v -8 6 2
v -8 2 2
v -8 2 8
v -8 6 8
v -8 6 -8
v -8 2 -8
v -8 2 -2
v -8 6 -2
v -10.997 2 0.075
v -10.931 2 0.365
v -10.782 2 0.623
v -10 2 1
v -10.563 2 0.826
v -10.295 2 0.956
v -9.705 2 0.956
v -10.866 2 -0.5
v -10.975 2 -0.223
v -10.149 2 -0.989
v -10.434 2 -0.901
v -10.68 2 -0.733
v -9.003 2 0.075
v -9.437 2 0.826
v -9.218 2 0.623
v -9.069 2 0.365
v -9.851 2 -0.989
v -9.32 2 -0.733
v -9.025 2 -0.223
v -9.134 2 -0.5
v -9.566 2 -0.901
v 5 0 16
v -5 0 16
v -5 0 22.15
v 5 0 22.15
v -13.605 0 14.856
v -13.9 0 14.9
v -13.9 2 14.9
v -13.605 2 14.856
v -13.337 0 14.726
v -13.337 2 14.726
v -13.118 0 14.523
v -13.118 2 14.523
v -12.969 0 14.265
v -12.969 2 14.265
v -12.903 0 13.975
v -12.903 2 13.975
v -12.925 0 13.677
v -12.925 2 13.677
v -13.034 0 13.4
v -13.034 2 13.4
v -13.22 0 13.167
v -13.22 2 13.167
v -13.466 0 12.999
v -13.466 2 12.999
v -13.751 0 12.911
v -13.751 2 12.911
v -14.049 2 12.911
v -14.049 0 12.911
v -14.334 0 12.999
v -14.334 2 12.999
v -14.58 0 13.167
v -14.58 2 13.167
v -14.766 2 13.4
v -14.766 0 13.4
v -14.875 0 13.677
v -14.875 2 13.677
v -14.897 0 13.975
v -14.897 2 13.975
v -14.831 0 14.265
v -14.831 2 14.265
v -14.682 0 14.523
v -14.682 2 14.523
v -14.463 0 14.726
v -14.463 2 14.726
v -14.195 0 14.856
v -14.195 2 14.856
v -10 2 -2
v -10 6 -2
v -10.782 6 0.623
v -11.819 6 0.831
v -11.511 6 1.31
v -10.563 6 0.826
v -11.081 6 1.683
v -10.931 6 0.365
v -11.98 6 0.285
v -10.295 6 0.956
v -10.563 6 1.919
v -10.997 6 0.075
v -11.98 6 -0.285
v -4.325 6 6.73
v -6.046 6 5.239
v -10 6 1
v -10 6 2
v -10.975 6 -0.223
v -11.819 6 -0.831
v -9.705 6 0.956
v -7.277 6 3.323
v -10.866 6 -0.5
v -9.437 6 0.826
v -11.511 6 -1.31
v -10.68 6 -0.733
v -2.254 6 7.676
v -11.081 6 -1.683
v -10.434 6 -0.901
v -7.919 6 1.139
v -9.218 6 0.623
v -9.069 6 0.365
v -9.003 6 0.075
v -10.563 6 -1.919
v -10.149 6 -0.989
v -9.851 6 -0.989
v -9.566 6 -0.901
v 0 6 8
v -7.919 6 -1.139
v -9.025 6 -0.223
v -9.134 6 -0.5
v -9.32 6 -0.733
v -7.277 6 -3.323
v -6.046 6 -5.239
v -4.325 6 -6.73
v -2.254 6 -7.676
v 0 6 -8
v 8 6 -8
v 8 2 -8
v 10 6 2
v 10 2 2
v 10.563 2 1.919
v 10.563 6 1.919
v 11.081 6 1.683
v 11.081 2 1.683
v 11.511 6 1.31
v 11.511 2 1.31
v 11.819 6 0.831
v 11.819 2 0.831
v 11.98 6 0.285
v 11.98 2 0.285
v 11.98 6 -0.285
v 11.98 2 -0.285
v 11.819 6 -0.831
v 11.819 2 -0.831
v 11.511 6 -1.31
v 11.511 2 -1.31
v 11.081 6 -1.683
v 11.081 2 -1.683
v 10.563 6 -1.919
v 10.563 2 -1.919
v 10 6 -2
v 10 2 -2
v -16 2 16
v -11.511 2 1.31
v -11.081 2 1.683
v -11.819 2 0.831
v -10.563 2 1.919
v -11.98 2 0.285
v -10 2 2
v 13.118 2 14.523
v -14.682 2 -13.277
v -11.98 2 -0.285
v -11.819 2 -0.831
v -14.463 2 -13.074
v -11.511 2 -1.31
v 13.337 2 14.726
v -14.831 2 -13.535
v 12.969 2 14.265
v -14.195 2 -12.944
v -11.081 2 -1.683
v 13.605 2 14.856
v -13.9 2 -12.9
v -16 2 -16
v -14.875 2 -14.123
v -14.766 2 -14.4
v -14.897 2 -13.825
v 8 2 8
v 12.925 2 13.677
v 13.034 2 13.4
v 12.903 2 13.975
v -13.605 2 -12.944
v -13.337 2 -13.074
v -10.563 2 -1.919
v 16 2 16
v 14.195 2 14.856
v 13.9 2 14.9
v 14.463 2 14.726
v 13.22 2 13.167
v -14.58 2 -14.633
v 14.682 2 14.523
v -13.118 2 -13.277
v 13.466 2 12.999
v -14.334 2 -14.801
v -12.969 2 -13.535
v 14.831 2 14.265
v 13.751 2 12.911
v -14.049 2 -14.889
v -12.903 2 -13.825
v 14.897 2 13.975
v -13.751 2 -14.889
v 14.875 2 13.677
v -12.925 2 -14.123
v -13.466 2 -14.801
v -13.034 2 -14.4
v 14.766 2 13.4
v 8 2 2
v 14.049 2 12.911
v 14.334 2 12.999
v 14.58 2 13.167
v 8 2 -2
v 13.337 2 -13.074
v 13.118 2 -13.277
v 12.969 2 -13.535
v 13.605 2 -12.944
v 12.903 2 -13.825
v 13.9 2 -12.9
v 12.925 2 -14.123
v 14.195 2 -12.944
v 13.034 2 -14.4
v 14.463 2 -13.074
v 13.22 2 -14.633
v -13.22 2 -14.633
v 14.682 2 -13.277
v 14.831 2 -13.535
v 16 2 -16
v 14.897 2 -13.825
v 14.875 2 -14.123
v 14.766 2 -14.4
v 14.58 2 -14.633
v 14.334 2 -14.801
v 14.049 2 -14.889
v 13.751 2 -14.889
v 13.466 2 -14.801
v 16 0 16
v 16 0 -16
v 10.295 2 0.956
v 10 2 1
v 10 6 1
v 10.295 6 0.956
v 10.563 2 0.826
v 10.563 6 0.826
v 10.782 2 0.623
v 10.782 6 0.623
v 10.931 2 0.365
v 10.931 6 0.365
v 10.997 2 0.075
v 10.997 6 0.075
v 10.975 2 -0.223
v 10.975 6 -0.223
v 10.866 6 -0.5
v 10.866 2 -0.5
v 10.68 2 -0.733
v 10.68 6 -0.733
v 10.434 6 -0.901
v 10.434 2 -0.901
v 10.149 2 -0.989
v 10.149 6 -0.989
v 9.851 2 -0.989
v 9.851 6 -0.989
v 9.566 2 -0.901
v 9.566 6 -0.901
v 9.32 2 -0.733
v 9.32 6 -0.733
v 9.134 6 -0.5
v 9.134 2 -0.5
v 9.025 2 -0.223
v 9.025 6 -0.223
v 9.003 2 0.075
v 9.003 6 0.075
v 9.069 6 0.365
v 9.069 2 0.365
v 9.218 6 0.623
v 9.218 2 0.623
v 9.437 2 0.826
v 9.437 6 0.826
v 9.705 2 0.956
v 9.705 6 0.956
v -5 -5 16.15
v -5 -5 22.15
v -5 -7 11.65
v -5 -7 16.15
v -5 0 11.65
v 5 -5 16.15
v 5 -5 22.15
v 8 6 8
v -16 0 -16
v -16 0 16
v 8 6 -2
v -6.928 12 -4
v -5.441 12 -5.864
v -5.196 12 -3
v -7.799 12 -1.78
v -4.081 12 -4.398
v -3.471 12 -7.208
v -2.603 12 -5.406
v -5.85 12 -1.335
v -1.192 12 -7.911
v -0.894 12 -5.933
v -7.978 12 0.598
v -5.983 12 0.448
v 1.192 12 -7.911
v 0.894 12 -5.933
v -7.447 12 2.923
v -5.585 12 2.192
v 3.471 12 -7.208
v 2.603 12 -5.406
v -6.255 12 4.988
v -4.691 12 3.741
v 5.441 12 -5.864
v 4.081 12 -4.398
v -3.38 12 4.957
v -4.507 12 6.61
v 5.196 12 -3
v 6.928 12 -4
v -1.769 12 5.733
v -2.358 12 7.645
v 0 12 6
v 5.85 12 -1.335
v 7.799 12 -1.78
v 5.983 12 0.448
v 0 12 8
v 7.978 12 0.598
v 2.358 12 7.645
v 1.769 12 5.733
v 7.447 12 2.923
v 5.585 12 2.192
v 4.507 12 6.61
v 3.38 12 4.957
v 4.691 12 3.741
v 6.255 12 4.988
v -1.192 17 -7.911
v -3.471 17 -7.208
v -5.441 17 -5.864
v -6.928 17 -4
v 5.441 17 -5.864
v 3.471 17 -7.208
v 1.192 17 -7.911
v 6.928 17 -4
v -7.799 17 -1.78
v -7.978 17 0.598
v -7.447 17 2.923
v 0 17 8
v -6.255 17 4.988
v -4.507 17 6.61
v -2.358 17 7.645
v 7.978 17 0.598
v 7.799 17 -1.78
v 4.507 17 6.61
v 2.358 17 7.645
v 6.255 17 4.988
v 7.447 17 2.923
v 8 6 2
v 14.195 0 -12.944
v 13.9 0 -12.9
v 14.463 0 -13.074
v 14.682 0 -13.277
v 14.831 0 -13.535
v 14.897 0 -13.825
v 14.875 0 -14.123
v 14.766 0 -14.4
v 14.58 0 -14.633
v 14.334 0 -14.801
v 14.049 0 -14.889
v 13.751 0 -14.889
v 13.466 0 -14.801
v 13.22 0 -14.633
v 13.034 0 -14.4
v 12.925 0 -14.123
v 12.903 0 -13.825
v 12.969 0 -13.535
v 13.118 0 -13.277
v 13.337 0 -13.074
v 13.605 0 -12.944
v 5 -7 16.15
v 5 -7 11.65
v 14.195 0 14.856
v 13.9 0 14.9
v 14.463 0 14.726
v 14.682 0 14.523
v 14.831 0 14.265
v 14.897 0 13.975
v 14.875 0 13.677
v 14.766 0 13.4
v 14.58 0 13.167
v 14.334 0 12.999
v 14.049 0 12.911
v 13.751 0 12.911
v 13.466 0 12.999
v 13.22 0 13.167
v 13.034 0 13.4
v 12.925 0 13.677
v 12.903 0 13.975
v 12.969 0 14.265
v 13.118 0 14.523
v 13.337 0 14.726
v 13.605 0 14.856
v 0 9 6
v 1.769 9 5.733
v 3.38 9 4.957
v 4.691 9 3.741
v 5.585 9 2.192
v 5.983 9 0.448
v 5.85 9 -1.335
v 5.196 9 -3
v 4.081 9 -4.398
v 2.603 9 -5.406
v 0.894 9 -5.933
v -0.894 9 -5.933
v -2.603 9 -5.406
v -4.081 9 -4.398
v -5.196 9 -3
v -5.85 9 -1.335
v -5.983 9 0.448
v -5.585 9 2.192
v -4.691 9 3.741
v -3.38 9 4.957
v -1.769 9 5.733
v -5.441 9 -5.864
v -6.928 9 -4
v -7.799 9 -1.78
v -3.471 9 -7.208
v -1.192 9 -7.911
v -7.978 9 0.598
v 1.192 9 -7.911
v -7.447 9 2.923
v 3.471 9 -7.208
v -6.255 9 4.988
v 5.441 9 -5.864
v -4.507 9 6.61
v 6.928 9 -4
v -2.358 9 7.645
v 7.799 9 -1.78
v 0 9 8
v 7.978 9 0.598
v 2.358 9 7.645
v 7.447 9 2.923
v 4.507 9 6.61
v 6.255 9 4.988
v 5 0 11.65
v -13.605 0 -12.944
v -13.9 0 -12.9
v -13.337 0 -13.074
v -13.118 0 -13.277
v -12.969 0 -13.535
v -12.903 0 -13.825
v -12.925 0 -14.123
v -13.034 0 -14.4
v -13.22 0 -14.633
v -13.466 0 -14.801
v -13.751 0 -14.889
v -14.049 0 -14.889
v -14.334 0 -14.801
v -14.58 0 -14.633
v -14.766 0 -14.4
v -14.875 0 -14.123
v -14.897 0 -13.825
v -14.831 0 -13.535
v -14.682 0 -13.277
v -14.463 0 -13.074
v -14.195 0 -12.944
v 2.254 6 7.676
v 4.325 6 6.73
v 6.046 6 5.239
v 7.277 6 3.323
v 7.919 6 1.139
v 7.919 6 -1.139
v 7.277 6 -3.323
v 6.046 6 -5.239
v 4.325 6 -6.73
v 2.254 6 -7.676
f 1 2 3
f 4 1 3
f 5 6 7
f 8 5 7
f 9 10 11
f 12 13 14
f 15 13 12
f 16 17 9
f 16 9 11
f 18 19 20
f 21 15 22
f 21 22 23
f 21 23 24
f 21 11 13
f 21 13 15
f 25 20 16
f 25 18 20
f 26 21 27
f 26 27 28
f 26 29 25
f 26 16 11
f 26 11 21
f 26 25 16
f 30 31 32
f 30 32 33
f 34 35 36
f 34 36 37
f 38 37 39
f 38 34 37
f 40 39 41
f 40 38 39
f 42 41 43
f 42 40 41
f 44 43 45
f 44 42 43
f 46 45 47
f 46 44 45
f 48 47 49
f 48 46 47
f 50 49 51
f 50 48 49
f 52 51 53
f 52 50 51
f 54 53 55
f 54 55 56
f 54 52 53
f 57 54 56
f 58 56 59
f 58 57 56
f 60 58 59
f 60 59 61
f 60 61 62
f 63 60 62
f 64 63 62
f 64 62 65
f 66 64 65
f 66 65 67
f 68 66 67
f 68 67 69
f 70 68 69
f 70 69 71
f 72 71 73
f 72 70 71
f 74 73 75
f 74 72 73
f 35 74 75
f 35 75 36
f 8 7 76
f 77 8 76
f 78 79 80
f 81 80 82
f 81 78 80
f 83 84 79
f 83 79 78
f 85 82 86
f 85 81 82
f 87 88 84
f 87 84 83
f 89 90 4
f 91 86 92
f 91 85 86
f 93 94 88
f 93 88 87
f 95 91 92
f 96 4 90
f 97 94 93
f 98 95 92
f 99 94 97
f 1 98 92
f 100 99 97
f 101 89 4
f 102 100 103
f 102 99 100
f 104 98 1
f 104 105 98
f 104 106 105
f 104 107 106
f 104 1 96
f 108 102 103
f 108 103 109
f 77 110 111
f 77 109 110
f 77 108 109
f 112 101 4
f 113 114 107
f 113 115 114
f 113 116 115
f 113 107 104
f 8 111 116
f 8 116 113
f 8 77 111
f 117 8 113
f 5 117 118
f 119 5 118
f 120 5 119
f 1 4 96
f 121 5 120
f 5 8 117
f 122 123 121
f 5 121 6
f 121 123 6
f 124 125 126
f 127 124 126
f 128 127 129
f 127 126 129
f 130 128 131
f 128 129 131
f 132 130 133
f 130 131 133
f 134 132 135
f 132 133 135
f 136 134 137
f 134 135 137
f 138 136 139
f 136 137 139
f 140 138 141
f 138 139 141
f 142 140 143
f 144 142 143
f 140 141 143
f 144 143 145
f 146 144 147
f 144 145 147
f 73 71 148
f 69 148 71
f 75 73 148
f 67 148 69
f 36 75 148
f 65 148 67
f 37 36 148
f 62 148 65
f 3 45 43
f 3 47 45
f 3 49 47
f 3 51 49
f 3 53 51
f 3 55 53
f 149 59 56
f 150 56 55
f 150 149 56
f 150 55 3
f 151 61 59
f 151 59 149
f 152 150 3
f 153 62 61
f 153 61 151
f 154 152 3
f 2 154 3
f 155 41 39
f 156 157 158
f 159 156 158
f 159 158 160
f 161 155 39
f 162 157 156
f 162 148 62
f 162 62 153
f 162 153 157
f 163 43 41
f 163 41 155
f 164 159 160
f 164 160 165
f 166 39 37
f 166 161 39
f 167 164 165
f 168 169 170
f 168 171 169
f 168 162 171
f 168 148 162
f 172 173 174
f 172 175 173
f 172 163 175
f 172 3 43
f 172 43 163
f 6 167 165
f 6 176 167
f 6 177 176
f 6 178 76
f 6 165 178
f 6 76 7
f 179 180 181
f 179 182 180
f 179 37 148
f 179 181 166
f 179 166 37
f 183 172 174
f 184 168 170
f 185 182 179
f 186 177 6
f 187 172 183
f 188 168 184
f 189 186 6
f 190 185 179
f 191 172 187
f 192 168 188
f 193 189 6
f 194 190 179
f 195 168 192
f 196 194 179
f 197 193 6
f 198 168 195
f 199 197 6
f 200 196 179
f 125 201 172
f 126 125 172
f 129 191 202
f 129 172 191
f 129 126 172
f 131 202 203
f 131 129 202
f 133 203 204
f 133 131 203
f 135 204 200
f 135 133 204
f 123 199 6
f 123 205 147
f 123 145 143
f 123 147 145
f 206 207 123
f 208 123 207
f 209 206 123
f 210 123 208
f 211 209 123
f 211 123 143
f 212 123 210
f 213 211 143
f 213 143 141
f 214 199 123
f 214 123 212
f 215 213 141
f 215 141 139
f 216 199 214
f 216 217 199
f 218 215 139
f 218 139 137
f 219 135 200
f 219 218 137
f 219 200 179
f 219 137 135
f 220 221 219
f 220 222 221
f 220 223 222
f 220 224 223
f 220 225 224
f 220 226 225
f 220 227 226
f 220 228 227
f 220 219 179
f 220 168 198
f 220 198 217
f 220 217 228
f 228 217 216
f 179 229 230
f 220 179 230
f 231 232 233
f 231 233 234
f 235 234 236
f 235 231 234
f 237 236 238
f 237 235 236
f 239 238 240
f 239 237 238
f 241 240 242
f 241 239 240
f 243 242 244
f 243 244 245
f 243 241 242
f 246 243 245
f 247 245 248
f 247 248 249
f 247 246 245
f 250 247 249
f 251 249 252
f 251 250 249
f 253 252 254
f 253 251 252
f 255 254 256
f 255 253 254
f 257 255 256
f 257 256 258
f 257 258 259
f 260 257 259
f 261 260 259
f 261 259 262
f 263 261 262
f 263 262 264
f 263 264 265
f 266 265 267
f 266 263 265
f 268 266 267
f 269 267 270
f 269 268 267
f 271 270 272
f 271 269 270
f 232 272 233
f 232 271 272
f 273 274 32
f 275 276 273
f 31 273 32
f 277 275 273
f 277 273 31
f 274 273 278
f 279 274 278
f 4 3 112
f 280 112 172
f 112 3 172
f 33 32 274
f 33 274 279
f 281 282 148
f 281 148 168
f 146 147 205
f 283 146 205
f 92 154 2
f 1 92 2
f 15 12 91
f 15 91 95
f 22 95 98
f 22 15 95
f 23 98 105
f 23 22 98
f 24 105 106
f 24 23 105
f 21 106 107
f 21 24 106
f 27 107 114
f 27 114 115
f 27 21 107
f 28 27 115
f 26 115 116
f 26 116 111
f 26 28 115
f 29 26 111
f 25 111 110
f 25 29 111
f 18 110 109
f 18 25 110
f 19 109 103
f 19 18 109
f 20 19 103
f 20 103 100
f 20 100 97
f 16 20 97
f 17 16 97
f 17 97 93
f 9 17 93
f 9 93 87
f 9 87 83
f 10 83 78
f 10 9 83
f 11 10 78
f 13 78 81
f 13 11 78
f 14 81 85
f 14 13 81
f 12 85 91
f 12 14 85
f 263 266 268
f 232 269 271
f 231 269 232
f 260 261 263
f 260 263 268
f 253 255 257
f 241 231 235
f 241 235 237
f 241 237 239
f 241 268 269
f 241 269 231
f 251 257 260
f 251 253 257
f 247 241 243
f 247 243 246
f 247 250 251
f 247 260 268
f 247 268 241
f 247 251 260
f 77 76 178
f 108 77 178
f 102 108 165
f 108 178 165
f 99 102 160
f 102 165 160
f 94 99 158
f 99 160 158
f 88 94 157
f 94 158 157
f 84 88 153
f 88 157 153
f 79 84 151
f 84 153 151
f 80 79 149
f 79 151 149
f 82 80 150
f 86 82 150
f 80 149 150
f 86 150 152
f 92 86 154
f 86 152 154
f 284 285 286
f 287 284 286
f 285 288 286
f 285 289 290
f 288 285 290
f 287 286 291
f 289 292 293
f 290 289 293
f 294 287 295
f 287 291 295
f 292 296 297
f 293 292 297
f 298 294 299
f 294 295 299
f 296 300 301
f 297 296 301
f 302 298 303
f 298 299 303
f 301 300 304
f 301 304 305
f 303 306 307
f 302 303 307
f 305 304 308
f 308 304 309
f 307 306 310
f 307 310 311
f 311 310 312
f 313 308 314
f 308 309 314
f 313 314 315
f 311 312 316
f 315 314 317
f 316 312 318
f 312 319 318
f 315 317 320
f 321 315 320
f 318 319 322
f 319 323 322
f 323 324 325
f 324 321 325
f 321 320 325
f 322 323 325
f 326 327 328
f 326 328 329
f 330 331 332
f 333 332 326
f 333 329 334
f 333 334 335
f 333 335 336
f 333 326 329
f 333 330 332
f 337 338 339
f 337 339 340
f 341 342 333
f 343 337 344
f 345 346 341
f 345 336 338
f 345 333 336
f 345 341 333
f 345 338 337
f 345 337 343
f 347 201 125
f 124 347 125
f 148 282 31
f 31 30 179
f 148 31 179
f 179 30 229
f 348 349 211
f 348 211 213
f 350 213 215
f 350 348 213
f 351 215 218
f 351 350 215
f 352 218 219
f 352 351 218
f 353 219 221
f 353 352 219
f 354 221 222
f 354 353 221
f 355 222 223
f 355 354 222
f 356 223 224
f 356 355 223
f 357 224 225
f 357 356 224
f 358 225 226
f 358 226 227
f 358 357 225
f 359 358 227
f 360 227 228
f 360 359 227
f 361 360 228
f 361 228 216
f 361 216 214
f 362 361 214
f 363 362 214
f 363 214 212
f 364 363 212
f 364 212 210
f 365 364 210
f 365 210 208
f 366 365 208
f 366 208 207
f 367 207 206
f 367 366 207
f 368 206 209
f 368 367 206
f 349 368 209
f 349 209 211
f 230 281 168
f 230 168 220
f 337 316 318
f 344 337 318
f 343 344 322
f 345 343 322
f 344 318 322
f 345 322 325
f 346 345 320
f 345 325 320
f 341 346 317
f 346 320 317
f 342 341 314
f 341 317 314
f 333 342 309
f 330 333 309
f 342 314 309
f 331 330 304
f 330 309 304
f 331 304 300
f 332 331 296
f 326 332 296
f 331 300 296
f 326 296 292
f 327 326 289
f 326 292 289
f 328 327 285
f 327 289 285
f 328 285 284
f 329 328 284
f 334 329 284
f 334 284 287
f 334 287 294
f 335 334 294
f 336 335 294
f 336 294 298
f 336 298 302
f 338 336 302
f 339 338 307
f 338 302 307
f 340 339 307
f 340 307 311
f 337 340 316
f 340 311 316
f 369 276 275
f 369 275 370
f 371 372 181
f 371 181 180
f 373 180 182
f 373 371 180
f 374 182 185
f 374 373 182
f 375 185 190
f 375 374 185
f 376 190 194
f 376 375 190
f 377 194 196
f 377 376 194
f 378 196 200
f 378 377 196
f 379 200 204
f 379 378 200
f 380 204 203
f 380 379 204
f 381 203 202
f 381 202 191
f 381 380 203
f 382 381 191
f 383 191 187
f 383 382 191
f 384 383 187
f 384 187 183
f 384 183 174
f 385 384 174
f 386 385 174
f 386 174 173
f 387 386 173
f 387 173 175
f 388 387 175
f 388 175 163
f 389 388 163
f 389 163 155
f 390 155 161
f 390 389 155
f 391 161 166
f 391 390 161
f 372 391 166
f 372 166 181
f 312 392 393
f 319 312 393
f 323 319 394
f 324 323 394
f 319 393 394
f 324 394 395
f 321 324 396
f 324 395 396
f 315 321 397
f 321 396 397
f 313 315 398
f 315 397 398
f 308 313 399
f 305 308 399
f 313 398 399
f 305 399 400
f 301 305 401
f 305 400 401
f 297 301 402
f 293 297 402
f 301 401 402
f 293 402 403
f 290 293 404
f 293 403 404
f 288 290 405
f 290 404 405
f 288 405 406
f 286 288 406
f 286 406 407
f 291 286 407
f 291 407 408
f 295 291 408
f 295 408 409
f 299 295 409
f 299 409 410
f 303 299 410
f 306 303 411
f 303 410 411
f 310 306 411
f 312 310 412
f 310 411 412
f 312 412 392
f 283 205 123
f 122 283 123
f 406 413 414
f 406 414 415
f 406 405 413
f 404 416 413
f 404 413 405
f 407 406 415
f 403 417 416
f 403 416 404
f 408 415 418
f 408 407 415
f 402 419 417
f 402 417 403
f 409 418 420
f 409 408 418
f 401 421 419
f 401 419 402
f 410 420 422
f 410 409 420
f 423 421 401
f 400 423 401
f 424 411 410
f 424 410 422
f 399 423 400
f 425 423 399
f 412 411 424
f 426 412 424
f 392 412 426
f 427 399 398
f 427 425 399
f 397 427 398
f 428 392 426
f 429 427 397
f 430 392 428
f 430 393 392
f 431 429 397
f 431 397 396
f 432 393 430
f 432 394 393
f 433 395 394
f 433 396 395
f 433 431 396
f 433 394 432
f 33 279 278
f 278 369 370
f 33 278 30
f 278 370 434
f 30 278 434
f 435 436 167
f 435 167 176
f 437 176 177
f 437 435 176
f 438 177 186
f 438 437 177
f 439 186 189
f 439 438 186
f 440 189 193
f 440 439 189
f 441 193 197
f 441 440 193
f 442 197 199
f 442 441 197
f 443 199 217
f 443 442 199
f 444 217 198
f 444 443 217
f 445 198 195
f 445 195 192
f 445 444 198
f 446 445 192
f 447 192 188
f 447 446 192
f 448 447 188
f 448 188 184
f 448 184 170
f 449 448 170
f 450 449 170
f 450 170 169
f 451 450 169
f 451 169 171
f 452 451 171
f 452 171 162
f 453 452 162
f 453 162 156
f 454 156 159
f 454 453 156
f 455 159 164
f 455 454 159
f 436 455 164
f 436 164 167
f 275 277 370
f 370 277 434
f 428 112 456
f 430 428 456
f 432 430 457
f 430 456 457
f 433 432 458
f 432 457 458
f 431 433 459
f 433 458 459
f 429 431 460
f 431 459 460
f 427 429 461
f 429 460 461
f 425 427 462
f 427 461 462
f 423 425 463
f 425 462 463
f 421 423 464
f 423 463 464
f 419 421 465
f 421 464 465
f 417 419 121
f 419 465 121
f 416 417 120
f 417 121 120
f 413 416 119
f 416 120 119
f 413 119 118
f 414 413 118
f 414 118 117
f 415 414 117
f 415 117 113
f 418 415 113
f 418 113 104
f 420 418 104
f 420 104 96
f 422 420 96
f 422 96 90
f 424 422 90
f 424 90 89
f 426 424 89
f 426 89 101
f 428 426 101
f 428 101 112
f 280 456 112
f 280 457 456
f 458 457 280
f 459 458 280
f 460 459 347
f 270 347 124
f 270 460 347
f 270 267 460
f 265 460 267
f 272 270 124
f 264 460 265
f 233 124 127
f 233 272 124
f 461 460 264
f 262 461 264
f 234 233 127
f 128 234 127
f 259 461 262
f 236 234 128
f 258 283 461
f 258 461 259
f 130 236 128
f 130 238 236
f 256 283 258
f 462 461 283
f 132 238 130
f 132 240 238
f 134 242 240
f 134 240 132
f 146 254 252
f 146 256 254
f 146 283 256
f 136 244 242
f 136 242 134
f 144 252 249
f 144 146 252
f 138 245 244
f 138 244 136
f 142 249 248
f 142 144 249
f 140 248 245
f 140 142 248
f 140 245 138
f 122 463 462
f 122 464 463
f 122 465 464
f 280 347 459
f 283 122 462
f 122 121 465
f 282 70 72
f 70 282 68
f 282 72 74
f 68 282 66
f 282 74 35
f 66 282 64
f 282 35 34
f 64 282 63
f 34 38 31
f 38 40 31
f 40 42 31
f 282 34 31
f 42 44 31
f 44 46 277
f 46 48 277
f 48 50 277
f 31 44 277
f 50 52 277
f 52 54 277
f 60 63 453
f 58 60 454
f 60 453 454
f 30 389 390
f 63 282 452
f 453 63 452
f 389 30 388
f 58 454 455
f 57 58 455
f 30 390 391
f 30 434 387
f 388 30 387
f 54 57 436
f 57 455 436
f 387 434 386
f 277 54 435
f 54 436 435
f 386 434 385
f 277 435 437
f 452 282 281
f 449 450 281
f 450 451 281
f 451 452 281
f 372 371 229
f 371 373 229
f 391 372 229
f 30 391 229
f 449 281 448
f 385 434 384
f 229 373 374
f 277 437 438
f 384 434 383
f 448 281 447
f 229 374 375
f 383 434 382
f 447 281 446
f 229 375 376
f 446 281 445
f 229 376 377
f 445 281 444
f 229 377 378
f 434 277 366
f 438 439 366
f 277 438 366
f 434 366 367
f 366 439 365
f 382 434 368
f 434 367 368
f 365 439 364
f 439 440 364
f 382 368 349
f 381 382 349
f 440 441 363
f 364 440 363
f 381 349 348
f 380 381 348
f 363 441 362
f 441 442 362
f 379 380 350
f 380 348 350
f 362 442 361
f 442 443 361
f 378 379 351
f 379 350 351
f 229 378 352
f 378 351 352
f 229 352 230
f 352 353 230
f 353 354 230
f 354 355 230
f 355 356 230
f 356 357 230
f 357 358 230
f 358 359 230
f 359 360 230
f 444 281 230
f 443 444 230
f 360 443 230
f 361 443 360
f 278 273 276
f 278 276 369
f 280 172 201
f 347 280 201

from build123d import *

# Parameters (mm, degrees)
SKETCH1_W           = 32
SKETCH1_H           = 32
SKETCH1_R           = 1
BOSS_EXTRUDE1_DEPTH = 2
SKETCH2_R           = 1
BOSS_EXTRUDE2_DEPTH = 4
SKETCH3_R           = 8
BOSS_EXTRUDE3_DEPTH = 3
SKETCH4_R           = 6
BOSS_EXTRUDE4_DEPTH = 3
SKETCH5_R           = 8
BOSS_EXTRUDE5_DEPTH = 5
SKETCH_1_W          = 10
SKETCH_1_H          = 4.5
EXTRUDE_1_DEPTH     = 7
SKETCH_2_W          = 10
SKETCH_2_H          = 5
EXTRUDE_2_DEPTH     = 6


with BuildPart() as part:
    # Sketch1 → Boss-Extrude1 (new body)
    with BuildSketch(Plane(origin=(0, 0, 0), x_dir=(1, 0, 0), z_dir=(0, 1, 0))):
        Rectangle(SKETCH1_W, SKETCH1_H)
        with Locations(Location((-13.9, 13.9, 0), (0, 0, 270))):
            Circle(SKETCH1_R, mode=Mode.SUBTRACT)
        with Locations(Location((13.9, 13.9, 0), (0, 0, 270))):
            Circle(SKETCH1_R, mode=Mode.SUBTRACT)
        with Locations(Location((-13.9, -13.9, 0), (0, 0, 270))):
            Circle(SKETCH1_R, mode=Mode.SUBTRACT)
        with Locations(Location((13.9, -13.9, 0), (0, 0, 270))):
            Circle(SKETCH1_R, mode=Mode.SUBTRACT)
    extrude(amount=BOSS_EXTRUDE1_DEPTH)

    # Sketch2 → Boss-Extrude2 (add)
    with BuildSketch(Plane(origin=(0, 2, 0), x_dir=(1, 0, 0), z_dir=(0, 1, 0))):
        with BuildLine():
            Line((-8, -8), (8, -8))
            Line((8, -8), (8, -2))
            Line((8, -2), (10, -2))
            ThreePointArc((10, -2), (12, 0), (10, 2))
            Line((10, 2), (8, 2))
            Line((8, 2), (8, 8))
            Line((8, 8), (-8, 8))
            Line((-8, 8), (-8, 2))
            Line((-8, 2), (-10, 2))
            ThreePointArc((-10, 2), (-12, 0), (-10, -2))
            Line((-10, -2), (-8, -2))
            Line((-8, -2), (-8, -8))
        make_face()
        with Locations(Location((10, 0, 0), (0, 0, 270))):
            Circle(SKETCH2_R, mode=Mode.SUBTRACT)
        with Locations(Location((-10, 0, 0), (0, 0, 270))):
            Circle(SKETCH2_R, mode=Mode.SUBTRACT)
    extrude(amount=BOSS_EXTRUDE2_DEPTH)

    # Sketch3 → Boss-Extrude3 (add)
    with BuildSketch(Plane(origin=(0, 6, 0), x_dir=(1, 0, 0), z_dir=(0, 1, 0))):
        with Locations(Location((0, 0, 0), (0, 0, 270))):
            Circle(SKETCH3_R)
    extrude(amount=BOSS_EXTRUDE3_DEPTH)

    # Sketch4 → Boss-Extrude4 (add)
    with BuildSketch(Plane(origin=(0, 9, 0), x_dir=(1, 0, 0), z_dir=(0, 1, 0))):
        with Locations(Location((0, 0, 0), (0, 0, 270))):
            Circle(SKETCH4_R)
    extrude(amount=BOSS_EXTRUDE4_DEPTH)

    # Sketch5 → Boss-Extrude5 (add)
    with BuildSketch(Plane(origin=(0, 12, 0), x_dir=(1, 0, 0), z_dir=(0, 1, 0))):
        with Locations(Location((0, 0, 0), (0, 0, 270))):
            Circle(SKETCH5_R)
    extrude(amount=BOSS_EXTRUDE5_DEPTH)

    # 草图1 → 凸台-拉伸1 (add)
    with BuildSketch(Plane.XZ):
        with Locations((0, 13.9)):
            Rectangle(SKETCH_1_W, SKETCH_1_H)
    extrude(amount=EXTRUDE_1_DEPTH)

    # 草图2 → 凸台-拉伸2 (add)
    with BuildSketch(Plane.XY.offset(16.15)):
        with Locations((0, -2.5)):
            Rectangle(SKETCH_2_W, SKETCH_2_H)
    extrude(amount=EXTRUDE_2_DEPTH)


solid = part.part
